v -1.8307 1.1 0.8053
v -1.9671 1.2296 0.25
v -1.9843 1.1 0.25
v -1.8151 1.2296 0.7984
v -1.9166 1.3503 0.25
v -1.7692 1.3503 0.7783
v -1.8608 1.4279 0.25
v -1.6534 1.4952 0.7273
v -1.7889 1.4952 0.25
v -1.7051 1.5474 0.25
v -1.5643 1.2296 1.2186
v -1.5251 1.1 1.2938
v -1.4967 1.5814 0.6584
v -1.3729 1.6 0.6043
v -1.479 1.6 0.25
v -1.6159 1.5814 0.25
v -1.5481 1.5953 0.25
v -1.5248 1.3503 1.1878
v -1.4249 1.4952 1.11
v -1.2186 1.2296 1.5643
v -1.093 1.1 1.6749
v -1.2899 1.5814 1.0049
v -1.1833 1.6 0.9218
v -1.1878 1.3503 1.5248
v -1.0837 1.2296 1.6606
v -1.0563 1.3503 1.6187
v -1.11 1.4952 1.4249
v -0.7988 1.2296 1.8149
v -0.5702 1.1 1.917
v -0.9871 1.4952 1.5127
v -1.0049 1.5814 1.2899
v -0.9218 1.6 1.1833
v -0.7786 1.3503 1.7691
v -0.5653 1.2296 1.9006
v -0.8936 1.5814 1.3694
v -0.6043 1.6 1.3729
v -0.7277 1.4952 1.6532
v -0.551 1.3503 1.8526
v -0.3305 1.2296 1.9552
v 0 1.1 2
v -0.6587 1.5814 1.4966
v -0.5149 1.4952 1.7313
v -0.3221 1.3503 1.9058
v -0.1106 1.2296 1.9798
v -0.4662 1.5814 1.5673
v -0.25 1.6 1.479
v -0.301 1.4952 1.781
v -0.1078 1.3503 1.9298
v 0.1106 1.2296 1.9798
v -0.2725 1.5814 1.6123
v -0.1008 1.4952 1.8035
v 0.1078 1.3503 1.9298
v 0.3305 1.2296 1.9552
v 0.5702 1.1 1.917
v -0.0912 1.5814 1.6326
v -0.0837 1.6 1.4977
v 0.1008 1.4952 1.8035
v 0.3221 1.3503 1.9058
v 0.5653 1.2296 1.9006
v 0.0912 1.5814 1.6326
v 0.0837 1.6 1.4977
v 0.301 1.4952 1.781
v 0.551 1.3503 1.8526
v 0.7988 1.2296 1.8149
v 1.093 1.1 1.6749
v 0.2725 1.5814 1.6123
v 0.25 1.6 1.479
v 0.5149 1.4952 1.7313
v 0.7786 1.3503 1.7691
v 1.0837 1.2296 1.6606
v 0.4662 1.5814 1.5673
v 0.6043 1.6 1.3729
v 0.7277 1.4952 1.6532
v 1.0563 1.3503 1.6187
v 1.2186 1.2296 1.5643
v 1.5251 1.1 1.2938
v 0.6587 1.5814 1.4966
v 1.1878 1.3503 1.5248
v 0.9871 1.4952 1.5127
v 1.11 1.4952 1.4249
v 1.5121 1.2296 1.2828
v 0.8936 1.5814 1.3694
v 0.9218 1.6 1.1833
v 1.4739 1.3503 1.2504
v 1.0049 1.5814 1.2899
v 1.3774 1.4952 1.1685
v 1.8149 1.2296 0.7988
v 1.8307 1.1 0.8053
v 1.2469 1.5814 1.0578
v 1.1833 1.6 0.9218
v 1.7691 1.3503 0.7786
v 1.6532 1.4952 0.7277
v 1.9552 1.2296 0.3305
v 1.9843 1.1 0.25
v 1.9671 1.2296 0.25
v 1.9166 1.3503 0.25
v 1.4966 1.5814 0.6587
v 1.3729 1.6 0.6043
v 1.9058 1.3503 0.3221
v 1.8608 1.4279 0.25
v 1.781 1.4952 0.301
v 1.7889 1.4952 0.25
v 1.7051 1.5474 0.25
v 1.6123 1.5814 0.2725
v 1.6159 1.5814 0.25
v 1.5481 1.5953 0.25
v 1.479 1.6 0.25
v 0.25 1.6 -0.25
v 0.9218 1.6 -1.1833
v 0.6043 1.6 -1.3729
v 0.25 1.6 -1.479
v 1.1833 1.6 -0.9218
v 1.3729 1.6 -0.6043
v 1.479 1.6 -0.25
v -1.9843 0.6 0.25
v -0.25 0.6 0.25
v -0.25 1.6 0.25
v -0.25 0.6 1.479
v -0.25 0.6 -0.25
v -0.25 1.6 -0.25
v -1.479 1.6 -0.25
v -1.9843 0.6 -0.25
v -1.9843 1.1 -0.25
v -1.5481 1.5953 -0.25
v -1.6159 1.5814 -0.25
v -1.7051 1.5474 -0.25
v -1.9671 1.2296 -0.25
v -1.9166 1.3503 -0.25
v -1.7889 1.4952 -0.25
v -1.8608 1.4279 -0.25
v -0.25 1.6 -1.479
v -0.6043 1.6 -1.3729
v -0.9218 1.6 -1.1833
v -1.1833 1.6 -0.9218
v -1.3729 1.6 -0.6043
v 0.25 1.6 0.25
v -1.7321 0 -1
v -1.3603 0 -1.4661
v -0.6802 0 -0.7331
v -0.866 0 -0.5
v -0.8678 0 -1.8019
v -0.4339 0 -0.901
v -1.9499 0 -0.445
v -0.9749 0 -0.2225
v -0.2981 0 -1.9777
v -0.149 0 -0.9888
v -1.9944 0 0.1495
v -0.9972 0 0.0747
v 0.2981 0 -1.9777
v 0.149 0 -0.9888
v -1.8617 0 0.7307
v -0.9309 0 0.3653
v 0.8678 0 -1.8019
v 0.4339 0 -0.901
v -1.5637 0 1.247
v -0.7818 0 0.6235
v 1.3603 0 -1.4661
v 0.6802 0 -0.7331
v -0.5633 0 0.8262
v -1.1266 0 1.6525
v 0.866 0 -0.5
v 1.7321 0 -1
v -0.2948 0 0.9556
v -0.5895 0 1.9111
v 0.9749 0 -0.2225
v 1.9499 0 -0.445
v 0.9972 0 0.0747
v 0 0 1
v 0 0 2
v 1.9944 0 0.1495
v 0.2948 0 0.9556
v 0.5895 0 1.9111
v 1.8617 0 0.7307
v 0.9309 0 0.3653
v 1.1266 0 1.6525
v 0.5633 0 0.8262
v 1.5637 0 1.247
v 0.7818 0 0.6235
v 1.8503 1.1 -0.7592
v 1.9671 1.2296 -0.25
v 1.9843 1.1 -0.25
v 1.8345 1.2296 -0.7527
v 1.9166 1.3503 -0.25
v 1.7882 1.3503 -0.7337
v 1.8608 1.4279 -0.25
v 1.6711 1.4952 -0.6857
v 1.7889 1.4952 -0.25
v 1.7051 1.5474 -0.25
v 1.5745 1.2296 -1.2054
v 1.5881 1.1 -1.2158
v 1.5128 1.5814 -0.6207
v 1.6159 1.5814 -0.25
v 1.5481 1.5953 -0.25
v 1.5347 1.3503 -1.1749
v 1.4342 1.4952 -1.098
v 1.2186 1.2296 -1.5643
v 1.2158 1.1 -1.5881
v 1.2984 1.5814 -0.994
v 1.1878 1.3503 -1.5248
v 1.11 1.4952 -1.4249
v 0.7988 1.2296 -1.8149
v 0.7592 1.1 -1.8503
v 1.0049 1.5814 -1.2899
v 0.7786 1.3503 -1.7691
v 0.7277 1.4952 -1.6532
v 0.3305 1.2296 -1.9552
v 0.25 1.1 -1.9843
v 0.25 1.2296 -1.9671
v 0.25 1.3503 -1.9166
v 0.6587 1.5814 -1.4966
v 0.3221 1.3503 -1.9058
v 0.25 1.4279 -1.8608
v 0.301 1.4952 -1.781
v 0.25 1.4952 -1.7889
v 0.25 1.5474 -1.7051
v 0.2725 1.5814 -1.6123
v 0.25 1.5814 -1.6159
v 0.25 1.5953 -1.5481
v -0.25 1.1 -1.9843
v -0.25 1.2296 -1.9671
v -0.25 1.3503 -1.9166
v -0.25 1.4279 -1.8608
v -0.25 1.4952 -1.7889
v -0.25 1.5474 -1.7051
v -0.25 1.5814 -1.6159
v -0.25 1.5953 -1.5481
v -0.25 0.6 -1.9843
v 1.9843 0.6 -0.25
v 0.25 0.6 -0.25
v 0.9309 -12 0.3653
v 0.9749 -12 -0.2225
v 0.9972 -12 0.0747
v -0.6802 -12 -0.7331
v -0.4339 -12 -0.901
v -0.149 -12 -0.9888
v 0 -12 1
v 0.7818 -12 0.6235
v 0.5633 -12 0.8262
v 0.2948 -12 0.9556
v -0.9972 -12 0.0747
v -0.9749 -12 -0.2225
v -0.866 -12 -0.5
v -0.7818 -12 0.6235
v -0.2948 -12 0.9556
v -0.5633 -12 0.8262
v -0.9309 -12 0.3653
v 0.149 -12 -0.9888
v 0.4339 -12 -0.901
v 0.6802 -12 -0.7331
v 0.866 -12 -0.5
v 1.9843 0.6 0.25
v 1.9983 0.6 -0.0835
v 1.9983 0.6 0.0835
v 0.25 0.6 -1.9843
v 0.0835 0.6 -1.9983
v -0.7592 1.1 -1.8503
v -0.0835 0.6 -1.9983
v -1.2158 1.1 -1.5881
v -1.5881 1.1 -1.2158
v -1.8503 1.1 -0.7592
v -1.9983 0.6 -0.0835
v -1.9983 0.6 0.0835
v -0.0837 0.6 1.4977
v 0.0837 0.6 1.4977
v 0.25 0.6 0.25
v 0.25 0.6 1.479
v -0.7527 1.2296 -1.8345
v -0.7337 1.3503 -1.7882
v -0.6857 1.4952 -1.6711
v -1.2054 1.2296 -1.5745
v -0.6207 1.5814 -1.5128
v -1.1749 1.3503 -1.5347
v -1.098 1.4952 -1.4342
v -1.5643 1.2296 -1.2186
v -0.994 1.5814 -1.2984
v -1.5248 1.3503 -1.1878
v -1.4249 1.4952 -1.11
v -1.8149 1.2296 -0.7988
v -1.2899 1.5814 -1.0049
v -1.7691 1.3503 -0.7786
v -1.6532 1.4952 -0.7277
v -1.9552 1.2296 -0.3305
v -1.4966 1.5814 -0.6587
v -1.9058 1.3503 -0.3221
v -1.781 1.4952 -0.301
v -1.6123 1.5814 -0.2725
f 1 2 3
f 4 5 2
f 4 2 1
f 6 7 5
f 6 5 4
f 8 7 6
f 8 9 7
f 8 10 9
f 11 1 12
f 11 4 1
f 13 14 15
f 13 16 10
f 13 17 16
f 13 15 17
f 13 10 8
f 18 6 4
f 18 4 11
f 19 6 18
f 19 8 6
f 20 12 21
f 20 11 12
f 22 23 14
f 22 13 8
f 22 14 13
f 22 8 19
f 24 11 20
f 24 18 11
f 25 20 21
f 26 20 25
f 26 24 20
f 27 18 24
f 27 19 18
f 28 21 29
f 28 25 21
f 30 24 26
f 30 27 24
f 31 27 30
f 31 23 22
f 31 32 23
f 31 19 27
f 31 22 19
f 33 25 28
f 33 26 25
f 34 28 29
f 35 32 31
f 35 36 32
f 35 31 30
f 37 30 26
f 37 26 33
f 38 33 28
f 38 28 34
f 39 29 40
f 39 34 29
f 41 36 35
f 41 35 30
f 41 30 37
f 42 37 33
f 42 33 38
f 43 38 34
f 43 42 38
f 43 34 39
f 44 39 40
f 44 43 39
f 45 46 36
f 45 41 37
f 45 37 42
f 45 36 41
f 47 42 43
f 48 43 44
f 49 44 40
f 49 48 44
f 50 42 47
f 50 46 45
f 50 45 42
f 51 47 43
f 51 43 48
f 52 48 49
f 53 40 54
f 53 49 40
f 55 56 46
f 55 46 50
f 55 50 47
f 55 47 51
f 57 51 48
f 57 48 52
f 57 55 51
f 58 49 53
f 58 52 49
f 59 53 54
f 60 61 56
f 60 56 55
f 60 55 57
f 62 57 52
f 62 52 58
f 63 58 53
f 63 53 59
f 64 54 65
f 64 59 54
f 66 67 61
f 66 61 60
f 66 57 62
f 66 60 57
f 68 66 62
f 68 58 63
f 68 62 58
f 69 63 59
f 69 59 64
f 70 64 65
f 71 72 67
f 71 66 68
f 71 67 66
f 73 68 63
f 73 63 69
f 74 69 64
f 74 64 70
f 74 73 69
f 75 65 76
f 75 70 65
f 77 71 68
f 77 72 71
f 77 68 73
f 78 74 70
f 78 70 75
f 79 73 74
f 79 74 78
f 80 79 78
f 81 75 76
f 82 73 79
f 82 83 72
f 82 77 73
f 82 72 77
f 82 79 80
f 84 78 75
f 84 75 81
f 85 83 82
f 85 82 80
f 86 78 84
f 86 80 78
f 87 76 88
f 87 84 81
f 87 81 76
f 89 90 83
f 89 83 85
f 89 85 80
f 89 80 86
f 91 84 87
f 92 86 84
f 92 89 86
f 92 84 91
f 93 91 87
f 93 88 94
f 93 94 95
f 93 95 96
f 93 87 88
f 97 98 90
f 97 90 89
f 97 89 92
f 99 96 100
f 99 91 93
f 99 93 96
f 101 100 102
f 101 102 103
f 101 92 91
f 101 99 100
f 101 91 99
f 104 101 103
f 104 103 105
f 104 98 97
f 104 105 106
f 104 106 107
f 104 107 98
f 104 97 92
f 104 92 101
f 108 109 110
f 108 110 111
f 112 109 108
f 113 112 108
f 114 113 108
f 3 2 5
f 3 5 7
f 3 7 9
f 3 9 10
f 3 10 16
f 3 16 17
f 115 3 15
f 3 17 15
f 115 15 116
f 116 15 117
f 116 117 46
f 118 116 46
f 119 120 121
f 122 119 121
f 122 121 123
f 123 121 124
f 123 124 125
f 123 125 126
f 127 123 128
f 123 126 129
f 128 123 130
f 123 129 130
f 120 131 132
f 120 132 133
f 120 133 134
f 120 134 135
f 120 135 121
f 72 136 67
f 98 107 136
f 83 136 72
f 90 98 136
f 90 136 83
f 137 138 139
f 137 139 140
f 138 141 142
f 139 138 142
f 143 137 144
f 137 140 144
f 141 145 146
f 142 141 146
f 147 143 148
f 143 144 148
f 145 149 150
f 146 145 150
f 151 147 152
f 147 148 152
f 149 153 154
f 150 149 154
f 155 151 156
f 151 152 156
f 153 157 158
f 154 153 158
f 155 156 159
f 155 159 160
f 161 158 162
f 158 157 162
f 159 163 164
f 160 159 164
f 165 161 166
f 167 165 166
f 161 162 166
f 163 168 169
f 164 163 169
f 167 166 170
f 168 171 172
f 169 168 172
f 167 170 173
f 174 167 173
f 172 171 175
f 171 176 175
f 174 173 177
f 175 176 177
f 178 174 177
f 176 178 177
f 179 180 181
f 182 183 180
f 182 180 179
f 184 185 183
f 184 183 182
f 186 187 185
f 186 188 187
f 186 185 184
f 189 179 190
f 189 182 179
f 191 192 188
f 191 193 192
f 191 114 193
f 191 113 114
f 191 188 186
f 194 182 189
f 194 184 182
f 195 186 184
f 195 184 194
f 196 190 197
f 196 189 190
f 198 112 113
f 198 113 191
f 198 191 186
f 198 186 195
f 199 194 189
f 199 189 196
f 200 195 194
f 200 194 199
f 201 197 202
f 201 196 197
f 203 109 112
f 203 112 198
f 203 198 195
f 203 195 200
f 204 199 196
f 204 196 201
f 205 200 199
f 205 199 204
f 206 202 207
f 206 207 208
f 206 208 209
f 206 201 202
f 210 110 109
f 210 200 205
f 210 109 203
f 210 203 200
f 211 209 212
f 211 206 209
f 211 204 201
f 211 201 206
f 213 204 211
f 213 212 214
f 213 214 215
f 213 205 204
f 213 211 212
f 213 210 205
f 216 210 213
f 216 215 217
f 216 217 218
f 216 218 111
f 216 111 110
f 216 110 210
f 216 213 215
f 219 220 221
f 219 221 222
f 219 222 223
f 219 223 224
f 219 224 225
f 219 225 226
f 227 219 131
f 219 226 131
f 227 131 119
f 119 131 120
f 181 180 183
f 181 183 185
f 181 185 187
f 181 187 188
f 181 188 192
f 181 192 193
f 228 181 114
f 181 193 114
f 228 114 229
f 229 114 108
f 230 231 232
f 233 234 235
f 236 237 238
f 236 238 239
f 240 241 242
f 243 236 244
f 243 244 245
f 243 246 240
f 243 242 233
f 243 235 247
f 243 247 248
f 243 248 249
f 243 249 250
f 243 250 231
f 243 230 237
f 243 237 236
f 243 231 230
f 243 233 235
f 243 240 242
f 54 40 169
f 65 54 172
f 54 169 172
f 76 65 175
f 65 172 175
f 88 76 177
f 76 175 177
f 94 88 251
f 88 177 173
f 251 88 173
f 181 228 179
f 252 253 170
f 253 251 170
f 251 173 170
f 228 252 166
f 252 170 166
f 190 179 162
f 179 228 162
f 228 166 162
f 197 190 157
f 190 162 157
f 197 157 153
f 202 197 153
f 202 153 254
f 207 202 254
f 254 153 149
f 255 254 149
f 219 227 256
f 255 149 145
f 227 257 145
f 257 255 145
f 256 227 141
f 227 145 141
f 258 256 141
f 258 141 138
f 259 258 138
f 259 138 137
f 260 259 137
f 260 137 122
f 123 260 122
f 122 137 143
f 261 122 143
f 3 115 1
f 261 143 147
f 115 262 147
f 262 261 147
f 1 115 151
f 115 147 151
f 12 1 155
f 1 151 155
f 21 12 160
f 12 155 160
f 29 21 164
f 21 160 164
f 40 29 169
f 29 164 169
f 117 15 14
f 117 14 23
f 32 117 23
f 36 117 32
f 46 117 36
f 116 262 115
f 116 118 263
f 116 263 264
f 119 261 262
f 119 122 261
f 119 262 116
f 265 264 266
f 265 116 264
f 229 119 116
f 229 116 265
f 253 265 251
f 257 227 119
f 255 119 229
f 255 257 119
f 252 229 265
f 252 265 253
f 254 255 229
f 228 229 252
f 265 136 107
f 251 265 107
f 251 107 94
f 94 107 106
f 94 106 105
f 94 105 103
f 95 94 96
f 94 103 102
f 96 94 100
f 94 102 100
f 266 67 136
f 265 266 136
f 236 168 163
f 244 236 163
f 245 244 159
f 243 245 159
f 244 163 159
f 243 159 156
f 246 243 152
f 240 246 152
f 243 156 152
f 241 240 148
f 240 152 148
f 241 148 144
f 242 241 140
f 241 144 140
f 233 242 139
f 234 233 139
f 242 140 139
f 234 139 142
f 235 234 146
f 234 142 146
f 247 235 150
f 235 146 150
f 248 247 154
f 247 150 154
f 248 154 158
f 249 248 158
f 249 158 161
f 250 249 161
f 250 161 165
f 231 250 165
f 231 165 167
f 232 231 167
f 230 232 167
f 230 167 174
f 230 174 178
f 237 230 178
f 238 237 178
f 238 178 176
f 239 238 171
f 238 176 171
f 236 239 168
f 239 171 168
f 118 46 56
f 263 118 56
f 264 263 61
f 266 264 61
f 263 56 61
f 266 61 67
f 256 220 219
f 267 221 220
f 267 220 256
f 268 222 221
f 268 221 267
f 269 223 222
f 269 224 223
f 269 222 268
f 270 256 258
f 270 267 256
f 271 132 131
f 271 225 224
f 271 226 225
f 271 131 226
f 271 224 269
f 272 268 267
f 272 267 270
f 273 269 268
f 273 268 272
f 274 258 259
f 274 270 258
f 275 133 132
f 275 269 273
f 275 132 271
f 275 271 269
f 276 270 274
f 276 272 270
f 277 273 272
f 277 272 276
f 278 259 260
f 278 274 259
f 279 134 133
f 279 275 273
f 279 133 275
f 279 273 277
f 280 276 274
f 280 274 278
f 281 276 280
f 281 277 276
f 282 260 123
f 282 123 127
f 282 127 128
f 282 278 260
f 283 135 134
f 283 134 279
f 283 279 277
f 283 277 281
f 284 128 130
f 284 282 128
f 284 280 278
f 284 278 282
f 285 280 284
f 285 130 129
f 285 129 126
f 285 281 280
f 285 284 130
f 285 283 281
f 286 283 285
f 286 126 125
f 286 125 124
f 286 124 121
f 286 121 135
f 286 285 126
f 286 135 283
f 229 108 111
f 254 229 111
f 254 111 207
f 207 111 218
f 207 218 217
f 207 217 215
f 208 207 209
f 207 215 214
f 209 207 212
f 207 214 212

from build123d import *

# Parameters (mm, degrees)
SKETCH1_R           = 2
BOSS_EXTRUDE1_DEPTH = 1.6
FILLET1_R           = 0.5
SKETCH2_R           = 1
BOSS_EXTRUDE2_DEPTH = 12
CUT_EXTRUDE1_DEPTH  = 1


with BuildPart() as part:
    # Sketch1 → Boss-Extrude1 (new body)
    with BuildSketch(Plane(origin=(0, 0, 0), x_dir=(1, 0, 0), z_dir=(0, 1, 0))):
        with Locations(Location((0, 0, 0), (0, 0, 270))):
            Circle(SKETCH1_R)
    extrude(amount=BOSS_EXTRUDE1_DEPTH)

    # Fillet1
    fillet1_edges = [part.edges().sort_by_distance(p)[0] for p in [
        (0, 1.6, -2),
    ]]
    fillet(fillet1_edges, radius=FILLET1_R)

    # Sketch2 → Boss-Extrude2 (add)
    with BuildSketch(Plane.XZ):
        with Locations(Location((0, 0, 0), (0, 0, 90))):
            Circle(SKETCH2_R)
    extrude(amount=BOSS_EXTRUDE2_DEPTH)

    # Sketch3 → Cut-Extrude1 (cut)
    with BuildSketch(Plane(origin=(0, 1.6, 0), x_dir=(1, 0, 0), z_dir=(0, 1, 0))):
        with BuildLine():
            ThreePointArc((0.25, 1.479019946), (0, 1.5), (-0.25, 1.479019946))
            Line((-0.25, 1.479019946), (-0.25, 0.25))
            Line((-0.25, 0.25), (-1.479019946, 0.25))
            ThreePointArc((-1.479019946, 0.25), (-1.5, 0), (-1.479019946, -0.25))
            Line((-1.479019946, -0.25), (-0.25, -0.25))
            Line((-0.25, -0.25), (-0.25, -1.479019946))
            ThreePointArc((-0.25, -1.479019946), (0, -1.5), (0.25, -1.479019946))
            Line((0.25, -1.479019946), (0.25, -0.25))
            Line((0.25, -0.25), (1.479019946, -0.25))
            ThreePointArc((1.479019946, -0.25), (1.494745784, -0.12543939), (1.5, 0))
            ThreePointArc((1.5, 0), (1.494745784, 0.12543939), (1.479019946, 0.25))
            Line((1.479019946, 0.25), (0.25, 0.25))
            Line((0.25, 0.25), (0.25, 1.479019946))
        make_face()
        with BuildLine():
            Line((2, 0.25), (1.479019946, 0.25))
            ThreePointArc((1.479019946, 0.25), (1.494745784, 0.12543939), (1.5, 0))
            ThreePointArc((1.5, 0), (1.494745784, -0.12543939), (1.479019946, -0.25))
            Line((1.479019946, -0.25), (2, -0.25))
            Line((2, -0.25), (2, 0.25))
        make_face()
        with BuildLine():
            ThreePointArc((-1.479019946, -0.25), (-1.5, 0), (-1.479019946, 0.25))
            Line((-1.479019946, 0.25), (-2, 0.25))
            Line((-2, 0.25), (-2, -0.25))
            Line((-2, -0.25), (-1.479019946, -0.25))
        make_face()
        with BuildLine():
            Line((0.25, 2), (-0.25, 2))
            Line((-0.25, 2), (-0.25, 1.479019946))
            ThreePointArc((-0.25, 1.479019946), (0, 1.5), (0.25, 1.479019946))
            Line((0.25, 1.479019946), (0.25, 2))
        make_face()
    extrude(amount=-CUT_EXTRUDE1_DEPTH, mode=Mode.SUBTRACT)


solid = part.part
